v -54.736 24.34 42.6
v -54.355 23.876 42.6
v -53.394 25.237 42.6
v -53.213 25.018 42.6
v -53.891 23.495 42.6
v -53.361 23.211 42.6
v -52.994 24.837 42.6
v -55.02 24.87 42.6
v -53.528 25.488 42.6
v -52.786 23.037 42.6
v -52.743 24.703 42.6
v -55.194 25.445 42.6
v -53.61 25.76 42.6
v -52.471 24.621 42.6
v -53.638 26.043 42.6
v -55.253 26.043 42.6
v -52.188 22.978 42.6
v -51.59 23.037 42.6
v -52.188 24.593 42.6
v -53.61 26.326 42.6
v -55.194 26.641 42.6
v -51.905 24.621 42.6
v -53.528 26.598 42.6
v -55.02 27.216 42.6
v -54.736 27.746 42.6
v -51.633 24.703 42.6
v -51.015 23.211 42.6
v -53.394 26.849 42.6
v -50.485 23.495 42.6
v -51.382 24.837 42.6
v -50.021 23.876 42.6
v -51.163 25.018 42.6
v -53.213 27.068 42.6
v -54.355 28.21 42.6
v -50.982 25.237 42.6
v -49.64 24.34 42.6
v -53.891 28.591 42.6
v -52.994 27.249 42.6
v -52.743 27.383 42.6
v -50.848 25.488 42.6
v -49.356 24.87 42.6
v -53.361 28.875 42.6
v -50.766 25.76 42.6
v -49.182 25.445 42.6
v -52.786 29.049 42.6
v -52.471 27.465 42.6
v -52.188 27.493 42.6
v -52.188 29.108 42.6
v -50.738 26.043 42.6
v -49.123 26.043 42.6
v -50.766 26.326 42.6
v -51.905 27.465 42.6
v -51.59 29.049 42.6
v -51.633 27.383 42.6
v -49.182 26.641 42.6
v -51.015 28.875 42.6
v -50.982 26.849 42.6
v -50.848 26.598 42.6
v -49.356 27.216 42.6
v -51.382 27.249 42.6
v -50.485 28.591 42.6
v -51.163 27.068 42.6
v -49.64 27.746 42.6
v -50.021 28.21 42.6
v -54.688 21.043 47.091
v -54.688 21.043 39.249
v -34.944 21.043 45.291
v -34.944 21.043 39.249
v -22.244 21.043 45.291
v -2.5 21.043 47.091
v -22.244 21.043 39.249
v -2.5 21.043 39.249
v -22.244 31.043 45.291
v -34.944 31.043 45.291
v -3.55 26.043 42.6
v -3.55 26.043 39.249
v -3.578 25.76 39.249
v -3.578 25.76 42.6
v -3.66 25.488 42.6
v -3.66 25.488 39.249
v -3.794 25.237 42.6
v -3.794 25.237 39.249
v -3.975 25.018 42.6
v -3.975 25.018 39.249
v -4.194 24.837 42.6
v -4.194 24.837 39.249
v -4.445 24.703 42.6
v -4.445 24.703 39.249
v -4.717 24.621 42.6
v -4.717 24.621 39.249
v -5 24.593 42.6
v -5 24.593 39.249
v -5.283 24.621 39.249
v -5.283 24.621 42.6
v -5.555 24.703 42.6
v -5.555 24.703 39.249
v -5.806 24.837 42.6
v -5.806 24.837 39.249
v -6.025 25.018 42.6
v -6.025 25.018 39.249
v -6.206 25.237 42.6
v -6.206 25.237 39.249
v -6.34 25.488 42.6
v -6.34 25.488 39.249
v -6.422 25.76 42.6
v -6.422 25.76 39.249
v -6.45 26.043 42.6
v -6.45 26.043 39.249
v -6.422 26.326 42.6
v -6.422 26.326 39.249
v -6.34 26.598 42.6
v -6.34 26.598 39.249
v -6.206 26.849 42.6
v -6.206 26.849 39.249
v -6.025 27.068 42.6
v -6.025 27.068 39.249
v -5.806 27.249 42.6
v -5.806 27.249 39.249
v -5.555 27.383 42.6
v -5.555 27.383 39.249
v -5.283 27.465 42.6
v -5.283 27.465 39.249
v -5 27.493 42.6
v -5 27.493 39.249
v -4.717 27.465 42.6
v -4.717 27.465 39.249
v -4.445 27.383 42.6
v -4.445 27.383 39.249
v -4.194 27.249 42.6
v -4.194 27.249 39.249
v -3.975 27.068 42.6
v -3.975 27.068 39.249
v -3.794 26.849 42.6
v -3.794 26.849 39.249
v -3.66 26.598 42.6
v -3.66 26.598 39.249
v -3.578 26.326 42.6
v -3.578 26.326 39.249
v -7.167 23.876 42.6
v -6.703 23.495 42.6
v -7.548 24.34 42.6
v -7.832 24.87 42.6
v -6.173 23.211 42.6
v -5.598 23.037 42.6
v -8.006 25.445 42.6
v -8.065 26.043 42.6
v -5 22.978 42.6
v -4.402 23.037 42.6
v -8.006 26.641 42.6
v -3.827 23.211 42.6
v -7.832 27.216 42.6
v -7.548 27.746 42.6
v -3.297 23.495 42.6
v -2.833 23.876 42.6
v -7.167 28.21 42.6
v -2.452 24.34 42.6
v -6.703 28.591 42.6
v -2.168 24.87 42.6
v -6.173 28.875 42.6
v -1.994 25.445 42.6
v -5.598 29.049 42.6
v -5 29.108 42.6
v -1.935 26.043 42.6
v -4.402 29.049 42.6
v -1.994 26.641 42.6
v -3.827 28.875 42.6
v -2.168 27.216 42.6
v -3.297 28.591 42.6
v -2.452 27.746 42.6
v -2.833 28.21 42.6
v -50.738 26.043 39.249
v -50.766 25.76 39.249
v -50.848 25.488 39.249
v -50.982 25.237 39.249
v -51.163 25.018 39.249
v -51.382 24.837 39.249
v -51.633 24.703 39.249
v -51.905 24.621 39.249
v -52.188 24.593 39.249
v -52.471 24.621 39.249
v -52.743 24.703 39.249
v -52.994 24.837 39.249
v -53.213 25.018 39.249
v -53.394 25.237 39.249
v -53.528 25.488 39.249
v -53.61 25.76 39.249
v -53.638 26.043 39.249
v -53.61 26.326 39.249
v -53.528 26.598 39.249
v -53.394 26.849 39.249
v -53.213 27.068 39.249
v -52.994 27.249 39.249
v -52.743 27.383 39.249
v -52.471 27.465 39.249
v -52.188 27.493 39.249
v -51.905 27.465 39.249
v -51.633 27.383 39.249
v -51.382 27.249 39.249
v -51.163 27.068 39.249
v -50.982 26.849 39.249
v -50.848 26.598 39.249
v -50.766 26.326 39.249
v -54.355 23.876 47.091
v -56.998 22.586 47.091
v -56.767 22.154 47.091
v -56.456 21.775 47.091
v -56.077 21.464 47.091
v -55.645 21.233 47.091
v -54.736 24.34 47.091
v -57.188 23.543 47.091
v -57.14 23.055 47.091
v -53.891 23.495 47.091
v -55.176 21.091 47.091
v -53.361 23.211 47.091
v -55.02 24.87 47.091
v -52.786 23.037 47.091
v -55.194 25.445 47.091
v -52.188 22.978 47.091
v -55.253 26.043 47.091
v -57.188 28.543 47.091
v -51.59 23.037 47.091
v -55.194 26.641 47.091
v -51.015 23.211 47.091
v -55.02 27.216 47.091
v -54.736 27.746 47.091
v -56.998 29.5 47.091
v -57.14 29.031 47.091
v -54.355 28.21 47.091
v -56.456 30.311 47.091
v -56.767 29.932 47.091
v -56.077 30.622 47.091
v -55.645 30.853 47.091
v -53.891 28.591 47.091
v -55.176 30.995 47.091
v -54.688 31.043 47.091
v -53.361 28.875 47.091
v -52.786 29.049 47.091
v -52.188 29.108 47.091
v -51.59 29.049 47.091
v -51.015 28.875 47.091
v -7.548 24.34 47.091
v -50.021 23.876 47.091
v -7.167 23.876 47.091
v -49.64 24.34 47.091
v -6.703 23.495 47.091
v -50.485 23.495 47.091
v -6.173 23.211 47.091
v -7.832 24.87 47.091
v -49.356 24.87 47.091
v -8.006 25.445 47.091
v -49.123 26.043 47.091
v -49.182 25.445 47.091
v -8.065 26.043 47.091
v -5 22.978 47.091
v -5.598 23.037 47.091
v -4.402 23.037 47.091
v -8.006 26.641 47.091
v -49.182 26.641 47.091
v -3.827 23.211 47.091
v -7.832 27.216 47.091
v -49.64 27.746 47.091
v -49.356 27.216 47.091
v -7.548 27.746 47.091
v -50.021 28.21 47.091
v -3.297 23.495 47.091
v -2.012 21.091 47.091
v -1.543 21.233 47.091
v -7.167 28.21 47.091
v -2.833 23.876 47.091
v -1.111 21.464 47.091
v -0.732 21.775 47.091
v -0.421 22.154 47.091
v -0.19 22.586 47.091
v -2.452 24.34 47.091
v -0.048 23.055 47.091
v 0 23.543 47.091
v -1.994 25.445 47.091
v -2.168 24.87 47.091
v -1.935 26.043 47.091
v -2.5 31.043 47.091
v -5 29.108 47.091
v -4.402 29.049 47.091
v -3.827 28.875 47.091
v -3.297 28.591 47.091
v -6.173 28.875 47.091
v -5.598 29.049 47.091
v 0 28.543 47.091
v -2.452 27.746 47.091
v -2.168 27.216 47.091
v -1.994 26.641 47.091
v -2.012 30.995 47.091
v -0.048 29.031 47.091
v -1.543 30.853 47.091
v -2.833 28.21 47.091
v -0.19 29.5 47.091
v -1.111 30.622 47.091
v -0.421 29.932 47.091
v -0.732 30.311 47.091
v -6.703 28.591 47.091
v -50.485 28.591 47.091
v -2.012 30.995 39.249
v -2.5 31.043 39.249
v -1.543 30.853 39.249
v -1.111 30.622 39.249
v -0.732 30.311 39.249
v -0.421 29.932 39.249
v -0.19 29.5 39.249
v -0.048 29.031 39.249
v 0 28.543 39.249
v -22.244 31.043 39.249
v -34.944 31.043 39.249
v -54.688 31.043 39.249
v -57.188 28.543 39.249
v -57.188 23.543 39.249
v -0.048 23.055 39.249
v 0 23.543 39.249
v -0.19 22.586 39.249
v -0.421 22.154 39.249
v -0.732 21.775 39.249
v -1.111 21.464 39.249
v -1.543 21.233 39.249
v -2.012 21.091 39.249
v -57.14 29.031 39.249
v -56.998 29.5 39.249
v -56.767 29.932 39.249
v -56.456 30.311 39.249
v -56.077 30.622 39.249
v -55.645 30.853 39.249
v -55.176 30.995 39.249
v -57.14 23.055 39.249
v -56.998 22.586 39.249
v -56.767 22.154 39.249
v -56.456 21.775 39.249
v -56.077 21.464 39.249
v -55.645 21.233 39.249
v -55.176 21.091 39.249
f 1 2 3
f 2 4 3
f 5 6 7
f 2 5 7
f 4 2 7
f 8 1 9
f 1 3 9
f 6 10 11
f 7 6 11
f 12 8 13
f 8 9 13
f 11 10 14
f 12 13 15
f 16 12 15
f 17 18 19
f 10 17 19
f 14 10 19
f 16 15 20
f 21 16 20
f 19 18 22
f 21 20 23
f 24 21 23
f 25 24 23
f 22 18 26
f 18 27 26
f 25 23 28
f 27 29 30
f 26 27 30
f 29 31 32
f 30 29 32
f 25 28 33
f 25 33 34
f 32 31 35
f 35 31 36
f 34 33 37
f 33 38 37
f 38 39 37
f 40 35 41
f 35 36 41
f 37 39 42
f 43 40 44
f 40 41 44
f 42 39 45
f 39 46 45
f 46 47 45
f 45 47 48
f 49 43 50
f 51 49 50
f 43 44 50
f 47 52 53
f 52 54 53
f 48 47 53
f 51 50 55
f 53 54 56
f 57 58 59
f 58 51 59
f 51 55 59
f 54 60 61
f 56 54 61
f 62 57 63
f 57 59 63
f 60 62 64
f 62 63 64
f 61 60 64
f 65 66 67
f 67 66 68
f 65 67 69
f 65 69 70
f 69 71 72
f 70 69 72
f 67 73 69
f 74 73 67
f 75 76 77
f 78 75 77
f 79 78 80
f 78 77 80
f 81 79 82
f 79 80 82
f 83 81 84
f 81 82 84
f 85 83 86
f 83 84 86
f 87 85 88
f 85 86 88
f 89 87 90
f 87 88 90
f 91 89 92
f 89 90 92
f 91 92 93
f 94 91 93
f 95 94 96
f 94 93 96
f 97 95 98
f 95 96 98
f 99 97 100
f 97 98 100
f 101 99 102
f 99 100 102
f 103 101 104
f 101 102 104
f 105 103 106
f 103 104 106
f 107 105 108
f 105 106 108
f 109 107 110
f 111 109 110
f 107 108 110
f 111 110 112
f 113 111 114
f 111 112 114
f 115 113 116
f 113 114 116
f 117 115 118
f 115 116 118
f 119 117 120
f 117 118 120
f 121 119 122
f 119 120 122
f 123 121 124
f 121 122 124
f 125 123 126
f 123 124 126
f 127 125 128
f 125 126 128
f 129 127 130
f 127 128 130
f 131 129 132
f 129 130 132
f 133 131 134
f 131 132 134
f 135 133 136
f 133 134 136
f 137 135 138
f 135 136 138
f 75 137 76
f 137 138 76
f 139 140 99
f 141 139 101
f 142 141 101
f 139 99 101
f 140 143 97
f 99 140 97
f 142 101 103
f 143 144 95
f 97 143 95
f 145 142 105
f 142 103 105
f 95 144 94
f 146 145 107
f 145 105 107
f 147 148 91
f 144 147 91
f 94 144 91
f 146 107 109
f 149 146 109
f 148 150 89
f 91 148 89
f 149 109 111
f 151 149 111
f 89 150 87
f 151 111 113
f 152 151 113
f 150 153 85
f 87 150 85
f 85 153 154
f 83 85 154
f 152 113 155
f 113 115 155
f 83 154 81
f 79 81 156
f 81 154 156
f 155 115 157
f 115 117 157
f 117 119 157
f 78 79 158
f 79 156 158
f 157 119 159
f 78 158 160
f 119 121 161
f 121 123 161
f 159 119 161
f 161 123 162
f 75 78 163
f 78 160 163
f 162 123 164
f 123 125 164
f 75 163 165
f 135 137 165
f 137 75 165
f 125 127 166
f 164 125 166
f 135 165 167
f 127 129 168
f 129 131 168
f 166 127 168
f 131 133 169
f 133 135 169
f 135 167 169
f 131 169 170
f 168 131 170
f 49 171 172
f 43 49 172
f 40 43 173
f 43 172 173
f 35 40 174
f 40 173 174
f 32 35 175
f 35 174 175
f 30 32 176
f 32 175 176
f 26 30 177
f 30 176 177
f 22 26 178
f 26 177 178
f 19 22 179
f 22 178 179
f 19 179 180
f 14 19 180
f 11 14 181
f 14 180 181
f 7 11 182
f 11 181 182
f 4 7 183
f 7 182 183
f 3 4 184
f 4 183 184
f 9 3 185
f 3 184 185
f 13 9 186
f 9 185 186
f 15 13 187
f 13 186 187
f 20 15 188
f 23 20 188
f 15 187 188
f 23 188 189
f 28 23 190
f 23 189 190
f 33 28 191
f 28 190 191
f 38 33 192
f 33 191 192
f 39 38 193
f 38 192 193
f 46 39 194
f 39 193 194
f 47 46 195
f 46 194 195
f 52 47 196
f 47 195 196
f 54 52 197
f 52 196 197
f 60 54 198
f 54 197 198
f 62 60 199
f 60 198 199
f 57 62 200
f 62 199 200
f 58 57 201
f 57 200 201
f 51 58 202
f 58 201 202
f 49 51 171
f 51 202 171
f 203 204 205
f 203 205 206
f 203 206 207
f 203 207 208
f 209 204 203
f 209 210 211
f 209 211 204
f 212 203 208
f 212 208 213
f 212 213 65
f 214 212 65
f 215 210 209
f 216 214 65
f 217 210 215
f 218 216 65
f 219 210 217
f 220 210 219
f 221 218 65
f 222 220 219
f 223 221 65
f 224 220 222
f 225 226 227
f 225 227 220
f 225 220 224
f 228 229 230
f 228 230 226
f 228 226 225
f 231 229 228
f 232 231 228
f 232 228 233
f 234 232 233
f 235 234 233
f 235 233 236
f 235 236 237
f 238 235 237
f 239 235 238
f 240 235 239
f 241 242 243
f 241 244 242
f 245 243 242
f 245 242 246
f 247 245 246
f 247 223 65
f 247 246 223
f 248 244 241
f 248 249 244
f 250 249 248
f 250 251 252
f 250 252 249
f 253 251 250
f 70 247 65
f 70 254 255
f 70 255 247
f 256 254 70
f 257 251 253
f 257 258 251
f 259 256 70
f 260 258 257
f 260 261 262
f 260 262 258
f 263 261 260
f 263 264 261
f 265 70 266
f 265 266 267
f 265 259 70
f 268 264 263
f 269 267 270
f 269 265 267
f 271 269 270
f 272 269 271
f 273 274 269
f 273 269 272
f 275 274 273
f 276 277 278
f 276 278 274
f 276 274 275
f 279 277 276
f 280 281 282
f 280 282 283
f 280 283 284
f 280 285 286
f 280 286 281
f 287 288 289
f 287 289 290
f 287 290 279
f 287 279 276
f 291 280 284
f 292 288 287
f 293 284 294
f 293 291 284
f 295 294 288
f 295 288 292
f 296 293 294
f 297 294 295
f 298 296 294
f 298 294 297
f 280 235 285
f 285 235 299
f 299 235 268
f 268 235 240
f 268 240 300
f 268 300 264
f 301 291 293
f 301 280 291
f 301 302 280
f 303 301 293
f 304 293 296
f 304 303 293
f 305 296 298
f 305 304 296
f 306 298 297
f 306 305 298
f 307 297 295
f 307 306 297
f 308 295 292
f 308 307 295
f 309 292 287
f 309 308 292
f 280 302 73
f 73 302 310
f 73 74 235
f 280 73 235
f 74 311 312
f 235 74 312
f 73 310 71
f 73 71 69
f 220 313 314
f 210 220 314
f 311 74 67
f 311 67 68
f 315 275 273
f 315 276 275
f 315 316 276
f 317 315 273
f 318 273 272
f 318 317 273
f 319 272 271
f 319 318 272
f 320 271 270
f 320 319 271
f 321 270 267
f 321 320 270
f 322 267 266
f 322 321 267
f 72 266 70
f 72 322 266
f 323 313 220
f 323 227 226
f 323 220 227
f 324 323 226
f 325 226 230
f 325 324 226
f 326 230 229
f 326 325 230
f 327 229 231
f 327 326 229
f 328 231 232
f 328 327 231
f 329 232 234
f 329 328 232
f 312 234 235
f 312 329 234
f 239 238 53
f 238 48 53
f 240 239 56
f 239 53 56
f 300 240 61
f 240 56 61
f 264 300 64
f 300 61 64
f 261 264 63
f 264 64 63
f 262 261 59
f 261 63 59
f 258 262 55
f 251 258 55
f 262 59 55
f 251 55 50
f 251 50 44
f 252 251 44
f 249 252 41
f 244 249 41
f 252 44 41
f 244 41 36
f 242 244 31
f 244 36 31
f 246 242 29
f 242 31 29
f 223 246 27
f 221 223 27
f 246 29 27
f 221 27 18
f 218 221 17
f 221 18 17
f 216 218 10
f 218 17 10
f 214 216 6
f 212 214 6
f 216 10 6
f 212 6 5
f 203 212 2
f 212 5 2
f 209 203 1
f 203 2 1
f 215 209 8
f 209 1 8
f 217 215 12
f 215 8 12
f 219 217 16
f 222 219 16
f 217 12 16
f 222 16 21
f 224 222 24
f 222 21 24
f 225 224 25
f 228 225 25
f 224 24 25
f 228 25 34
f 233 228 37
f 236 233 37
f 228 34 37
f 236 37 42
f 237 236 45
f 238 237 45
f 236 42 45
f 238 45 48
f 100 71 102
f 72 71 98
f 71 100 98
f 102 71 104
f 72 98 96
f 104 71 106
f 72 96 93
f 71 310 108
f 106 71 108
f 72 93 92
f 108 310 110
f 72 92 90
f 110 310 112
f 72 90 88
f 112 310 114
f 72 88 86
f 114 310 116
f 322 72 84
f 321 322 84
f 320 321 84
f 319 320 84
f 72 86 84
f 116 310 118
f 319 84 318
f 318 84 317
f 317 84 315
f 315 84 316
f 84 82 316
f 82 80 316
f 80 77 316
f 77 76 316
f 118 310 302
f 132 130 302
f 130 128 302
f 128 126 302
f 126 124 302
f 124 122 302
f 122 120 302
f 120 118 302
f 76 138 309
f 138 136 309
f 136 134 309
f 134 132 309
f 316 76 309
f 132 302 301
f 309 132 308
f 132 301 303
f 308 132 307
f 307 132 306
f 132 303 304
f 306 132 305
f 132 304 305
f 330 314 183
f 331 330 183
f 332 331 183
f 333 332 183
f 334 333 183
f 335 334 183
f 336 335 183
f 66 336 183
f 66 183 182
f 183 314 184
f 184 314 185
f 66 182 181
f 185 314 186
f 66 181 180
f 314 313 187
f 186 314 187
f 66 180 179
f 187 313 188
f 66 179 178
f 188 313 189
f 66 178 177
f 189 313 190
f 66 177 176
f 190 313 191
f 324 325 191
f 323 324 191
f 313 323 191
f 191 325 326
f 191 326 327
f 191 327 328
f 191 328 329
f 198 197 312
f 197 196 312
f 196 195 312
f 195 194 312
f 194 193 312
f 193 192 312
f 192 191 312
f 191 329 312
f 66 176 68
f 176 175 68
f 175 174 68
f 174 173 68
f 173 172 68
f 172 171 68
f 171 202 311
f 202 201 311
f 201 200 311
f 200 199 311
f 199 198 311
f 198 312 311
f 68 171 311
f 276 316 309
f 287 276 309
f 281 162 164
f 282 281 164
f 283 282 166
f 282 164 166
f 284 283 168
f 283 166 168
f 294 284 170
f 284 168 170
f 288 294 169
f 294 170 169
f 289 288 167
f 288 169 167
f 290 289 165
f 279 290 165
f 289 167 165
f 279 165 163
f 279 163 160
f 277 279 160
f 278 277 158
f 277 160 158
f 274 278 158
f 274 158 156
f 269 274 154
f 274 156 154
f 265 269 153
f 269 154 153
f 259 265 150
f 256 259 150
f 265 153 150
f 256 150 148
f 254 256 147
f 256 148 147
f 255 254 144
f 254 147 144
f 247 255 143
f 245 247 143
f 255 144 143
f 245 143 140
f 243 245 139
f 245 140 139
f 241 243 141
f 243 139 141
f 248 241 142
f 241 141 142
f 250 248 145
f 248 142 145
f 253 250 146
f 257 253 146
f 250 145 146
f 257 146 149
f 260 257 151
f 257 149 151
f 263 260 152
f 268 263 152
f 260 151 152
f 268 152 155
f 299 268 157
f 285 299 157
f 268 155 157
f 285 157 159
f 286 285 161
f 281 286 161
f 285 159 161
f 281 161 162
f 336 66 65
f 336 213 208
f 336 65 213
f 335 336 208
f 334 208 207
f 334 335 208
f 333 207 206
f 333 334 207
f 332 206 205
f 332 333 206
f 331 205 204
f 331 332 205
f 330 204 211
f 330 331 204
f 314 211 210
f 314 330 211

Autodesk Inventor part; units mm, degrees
ref_plane "YZ Plane" through (0, 0, 0) normal (1, 0, 0) x (0, 1, 0)
ref_plane "XZ Plane" through (0, 0, 0) normal (0, 1, 0) x (-1, 0, 0)
ref_plane "XY Plane" through (0, 0, 0) normal (0, 0, 1) x (1, 0, 0)
ref_plane "Work Plane1" through (-28.594, 4.5215, 39.249) normal (0, 0, 1) x (1, 0, 0)
sketch "Sketch1" plane through (-28.594, 4.5215, 39.249) normal (0, 0, 1) x (1, 0, 0)
  circle A0 centre (23.594, 21.5215) radius 1.45 projected
  circle A1 centre (-23.594, 21.5215) radius 1.45 projected
  circle A2 centre (23.594, 21.5215) radius 1.45 projected
  arc A3 (-26.094, 26.5215) -> (-28.594, 24.0215) centre (-26.094, 24.0215) ccw projected
  line L0 (26.094, 26.5215) -> (-26.094, 26.5215) projected
  arc A4 (28.594, 24.0215) -> (26.094, 26.5215) centre (26.094, 24.0215) ccw projected
  line L1 (28.594, 19.0215) -> (28.594, 24.0215) projected
  arc A5 (26.094, 16.5215) -> (28.594, 19.0215) centre (26.094, 19.0215) ccw projected
  line L2 (-26.094, 16.5215) -> (26.094, 16.5215) projected
  arc A6 (-28.594, 19.0215) -> (-26.094, 16.5215) centre (-26.094, 19.0215) ccw projected
  line L3 (-28.594, 24.0215) -> (-28.594, 19.0215) projected
  circle A7 centre (-23.594, 21.5215) radius 1.45 projected
  point P0 (28.594, -4.5215)
extrude "Extrusion1" add sketch "Sketch1" along normal blind 7.842
sketch "Sketch2" plane through (-54.688, 31.043, 39.249) normal (0, 1, 0) x (1, 0, 0)
  line L0 (32.3438, -5.842) -> (19.8438, -5.842) construction
  line L1 (19.8438, -5.842) -> (19.8438, 0) construction
  line L2 (19.8438, 0) -> (32.3438, 0) construction
  line L3 (32.3438, 0) -> (32.3438, -5.842) construction
  line L4 (52.188, 0) -> (0, 0) projected
  line L5 (32.4438, 0) -> (32.4438, -6.042)
  line L6 (32.4438, -6.042) -> (19.7438, -6.042)
  line L7 (19.7438, -6.042) -> (19.7438, 0)
  point P0 (54.688, 39.249)
  dimension "d2" = 0.1
  dimension "d3" = 0.1
  dimension "d4" = 0.2
extrude "Extrusion2" cut sketch "Sketch2" against normal blind 12.908
ref_plane "Work Plane2" through (-52.188, -17, 42.6) normal (0, 0, -1) x (0, 1, 0)
sketch "Sketch3" plane through (-52.188, -17, 42.6) normal (0, 0, -1) x (0, 1, 0)
  line L0 (45.543, -5) -> (40.543, -5) projected
  arc A0 (38.043, -2.5) -> (40.543, -5) centre (40.543, -2.5) ccw projected
  line L1 (38.043, -2.5) -> (38.043, 49.688) projected
  arc A1 (40.543, 52.188) -> (38.043, 49.688) centre (40.543, 49.688) ccw projected
  line L2 (40.543, 52.188) -> (45.543, 52.188) projected
  arc A2 (48.043, 49.688) -> (45.543, 52.188) centre (45.543, 49.688) ccw projected
  line L3 (48.043, 49.688) -> (48.043, -2.5) projected
  arc A3 (45.543, -5) -> (48.043, -2.5) centre (45.543, -2.5) ccw projected
  circle A4 centre (43.043, 47.188) radius 1.45 projected
  circle A5 centre (43.043, 0) radius 1.45 projected
  circle A6 centre (0, 47.188) radius 3.065 projected
  circle A7 centre (43.043, 47.188) radius 3.065 projected
  circle A8 centre (43.043, 0) radius 3.065 projected
  point P0 (17, 52.188)
extrude "Extrusion3" cut sketch "Sketch3" against normal blind 12.908 contours A4 | A5 | A7 | A8
properties part number "connectorHolder_V6"
